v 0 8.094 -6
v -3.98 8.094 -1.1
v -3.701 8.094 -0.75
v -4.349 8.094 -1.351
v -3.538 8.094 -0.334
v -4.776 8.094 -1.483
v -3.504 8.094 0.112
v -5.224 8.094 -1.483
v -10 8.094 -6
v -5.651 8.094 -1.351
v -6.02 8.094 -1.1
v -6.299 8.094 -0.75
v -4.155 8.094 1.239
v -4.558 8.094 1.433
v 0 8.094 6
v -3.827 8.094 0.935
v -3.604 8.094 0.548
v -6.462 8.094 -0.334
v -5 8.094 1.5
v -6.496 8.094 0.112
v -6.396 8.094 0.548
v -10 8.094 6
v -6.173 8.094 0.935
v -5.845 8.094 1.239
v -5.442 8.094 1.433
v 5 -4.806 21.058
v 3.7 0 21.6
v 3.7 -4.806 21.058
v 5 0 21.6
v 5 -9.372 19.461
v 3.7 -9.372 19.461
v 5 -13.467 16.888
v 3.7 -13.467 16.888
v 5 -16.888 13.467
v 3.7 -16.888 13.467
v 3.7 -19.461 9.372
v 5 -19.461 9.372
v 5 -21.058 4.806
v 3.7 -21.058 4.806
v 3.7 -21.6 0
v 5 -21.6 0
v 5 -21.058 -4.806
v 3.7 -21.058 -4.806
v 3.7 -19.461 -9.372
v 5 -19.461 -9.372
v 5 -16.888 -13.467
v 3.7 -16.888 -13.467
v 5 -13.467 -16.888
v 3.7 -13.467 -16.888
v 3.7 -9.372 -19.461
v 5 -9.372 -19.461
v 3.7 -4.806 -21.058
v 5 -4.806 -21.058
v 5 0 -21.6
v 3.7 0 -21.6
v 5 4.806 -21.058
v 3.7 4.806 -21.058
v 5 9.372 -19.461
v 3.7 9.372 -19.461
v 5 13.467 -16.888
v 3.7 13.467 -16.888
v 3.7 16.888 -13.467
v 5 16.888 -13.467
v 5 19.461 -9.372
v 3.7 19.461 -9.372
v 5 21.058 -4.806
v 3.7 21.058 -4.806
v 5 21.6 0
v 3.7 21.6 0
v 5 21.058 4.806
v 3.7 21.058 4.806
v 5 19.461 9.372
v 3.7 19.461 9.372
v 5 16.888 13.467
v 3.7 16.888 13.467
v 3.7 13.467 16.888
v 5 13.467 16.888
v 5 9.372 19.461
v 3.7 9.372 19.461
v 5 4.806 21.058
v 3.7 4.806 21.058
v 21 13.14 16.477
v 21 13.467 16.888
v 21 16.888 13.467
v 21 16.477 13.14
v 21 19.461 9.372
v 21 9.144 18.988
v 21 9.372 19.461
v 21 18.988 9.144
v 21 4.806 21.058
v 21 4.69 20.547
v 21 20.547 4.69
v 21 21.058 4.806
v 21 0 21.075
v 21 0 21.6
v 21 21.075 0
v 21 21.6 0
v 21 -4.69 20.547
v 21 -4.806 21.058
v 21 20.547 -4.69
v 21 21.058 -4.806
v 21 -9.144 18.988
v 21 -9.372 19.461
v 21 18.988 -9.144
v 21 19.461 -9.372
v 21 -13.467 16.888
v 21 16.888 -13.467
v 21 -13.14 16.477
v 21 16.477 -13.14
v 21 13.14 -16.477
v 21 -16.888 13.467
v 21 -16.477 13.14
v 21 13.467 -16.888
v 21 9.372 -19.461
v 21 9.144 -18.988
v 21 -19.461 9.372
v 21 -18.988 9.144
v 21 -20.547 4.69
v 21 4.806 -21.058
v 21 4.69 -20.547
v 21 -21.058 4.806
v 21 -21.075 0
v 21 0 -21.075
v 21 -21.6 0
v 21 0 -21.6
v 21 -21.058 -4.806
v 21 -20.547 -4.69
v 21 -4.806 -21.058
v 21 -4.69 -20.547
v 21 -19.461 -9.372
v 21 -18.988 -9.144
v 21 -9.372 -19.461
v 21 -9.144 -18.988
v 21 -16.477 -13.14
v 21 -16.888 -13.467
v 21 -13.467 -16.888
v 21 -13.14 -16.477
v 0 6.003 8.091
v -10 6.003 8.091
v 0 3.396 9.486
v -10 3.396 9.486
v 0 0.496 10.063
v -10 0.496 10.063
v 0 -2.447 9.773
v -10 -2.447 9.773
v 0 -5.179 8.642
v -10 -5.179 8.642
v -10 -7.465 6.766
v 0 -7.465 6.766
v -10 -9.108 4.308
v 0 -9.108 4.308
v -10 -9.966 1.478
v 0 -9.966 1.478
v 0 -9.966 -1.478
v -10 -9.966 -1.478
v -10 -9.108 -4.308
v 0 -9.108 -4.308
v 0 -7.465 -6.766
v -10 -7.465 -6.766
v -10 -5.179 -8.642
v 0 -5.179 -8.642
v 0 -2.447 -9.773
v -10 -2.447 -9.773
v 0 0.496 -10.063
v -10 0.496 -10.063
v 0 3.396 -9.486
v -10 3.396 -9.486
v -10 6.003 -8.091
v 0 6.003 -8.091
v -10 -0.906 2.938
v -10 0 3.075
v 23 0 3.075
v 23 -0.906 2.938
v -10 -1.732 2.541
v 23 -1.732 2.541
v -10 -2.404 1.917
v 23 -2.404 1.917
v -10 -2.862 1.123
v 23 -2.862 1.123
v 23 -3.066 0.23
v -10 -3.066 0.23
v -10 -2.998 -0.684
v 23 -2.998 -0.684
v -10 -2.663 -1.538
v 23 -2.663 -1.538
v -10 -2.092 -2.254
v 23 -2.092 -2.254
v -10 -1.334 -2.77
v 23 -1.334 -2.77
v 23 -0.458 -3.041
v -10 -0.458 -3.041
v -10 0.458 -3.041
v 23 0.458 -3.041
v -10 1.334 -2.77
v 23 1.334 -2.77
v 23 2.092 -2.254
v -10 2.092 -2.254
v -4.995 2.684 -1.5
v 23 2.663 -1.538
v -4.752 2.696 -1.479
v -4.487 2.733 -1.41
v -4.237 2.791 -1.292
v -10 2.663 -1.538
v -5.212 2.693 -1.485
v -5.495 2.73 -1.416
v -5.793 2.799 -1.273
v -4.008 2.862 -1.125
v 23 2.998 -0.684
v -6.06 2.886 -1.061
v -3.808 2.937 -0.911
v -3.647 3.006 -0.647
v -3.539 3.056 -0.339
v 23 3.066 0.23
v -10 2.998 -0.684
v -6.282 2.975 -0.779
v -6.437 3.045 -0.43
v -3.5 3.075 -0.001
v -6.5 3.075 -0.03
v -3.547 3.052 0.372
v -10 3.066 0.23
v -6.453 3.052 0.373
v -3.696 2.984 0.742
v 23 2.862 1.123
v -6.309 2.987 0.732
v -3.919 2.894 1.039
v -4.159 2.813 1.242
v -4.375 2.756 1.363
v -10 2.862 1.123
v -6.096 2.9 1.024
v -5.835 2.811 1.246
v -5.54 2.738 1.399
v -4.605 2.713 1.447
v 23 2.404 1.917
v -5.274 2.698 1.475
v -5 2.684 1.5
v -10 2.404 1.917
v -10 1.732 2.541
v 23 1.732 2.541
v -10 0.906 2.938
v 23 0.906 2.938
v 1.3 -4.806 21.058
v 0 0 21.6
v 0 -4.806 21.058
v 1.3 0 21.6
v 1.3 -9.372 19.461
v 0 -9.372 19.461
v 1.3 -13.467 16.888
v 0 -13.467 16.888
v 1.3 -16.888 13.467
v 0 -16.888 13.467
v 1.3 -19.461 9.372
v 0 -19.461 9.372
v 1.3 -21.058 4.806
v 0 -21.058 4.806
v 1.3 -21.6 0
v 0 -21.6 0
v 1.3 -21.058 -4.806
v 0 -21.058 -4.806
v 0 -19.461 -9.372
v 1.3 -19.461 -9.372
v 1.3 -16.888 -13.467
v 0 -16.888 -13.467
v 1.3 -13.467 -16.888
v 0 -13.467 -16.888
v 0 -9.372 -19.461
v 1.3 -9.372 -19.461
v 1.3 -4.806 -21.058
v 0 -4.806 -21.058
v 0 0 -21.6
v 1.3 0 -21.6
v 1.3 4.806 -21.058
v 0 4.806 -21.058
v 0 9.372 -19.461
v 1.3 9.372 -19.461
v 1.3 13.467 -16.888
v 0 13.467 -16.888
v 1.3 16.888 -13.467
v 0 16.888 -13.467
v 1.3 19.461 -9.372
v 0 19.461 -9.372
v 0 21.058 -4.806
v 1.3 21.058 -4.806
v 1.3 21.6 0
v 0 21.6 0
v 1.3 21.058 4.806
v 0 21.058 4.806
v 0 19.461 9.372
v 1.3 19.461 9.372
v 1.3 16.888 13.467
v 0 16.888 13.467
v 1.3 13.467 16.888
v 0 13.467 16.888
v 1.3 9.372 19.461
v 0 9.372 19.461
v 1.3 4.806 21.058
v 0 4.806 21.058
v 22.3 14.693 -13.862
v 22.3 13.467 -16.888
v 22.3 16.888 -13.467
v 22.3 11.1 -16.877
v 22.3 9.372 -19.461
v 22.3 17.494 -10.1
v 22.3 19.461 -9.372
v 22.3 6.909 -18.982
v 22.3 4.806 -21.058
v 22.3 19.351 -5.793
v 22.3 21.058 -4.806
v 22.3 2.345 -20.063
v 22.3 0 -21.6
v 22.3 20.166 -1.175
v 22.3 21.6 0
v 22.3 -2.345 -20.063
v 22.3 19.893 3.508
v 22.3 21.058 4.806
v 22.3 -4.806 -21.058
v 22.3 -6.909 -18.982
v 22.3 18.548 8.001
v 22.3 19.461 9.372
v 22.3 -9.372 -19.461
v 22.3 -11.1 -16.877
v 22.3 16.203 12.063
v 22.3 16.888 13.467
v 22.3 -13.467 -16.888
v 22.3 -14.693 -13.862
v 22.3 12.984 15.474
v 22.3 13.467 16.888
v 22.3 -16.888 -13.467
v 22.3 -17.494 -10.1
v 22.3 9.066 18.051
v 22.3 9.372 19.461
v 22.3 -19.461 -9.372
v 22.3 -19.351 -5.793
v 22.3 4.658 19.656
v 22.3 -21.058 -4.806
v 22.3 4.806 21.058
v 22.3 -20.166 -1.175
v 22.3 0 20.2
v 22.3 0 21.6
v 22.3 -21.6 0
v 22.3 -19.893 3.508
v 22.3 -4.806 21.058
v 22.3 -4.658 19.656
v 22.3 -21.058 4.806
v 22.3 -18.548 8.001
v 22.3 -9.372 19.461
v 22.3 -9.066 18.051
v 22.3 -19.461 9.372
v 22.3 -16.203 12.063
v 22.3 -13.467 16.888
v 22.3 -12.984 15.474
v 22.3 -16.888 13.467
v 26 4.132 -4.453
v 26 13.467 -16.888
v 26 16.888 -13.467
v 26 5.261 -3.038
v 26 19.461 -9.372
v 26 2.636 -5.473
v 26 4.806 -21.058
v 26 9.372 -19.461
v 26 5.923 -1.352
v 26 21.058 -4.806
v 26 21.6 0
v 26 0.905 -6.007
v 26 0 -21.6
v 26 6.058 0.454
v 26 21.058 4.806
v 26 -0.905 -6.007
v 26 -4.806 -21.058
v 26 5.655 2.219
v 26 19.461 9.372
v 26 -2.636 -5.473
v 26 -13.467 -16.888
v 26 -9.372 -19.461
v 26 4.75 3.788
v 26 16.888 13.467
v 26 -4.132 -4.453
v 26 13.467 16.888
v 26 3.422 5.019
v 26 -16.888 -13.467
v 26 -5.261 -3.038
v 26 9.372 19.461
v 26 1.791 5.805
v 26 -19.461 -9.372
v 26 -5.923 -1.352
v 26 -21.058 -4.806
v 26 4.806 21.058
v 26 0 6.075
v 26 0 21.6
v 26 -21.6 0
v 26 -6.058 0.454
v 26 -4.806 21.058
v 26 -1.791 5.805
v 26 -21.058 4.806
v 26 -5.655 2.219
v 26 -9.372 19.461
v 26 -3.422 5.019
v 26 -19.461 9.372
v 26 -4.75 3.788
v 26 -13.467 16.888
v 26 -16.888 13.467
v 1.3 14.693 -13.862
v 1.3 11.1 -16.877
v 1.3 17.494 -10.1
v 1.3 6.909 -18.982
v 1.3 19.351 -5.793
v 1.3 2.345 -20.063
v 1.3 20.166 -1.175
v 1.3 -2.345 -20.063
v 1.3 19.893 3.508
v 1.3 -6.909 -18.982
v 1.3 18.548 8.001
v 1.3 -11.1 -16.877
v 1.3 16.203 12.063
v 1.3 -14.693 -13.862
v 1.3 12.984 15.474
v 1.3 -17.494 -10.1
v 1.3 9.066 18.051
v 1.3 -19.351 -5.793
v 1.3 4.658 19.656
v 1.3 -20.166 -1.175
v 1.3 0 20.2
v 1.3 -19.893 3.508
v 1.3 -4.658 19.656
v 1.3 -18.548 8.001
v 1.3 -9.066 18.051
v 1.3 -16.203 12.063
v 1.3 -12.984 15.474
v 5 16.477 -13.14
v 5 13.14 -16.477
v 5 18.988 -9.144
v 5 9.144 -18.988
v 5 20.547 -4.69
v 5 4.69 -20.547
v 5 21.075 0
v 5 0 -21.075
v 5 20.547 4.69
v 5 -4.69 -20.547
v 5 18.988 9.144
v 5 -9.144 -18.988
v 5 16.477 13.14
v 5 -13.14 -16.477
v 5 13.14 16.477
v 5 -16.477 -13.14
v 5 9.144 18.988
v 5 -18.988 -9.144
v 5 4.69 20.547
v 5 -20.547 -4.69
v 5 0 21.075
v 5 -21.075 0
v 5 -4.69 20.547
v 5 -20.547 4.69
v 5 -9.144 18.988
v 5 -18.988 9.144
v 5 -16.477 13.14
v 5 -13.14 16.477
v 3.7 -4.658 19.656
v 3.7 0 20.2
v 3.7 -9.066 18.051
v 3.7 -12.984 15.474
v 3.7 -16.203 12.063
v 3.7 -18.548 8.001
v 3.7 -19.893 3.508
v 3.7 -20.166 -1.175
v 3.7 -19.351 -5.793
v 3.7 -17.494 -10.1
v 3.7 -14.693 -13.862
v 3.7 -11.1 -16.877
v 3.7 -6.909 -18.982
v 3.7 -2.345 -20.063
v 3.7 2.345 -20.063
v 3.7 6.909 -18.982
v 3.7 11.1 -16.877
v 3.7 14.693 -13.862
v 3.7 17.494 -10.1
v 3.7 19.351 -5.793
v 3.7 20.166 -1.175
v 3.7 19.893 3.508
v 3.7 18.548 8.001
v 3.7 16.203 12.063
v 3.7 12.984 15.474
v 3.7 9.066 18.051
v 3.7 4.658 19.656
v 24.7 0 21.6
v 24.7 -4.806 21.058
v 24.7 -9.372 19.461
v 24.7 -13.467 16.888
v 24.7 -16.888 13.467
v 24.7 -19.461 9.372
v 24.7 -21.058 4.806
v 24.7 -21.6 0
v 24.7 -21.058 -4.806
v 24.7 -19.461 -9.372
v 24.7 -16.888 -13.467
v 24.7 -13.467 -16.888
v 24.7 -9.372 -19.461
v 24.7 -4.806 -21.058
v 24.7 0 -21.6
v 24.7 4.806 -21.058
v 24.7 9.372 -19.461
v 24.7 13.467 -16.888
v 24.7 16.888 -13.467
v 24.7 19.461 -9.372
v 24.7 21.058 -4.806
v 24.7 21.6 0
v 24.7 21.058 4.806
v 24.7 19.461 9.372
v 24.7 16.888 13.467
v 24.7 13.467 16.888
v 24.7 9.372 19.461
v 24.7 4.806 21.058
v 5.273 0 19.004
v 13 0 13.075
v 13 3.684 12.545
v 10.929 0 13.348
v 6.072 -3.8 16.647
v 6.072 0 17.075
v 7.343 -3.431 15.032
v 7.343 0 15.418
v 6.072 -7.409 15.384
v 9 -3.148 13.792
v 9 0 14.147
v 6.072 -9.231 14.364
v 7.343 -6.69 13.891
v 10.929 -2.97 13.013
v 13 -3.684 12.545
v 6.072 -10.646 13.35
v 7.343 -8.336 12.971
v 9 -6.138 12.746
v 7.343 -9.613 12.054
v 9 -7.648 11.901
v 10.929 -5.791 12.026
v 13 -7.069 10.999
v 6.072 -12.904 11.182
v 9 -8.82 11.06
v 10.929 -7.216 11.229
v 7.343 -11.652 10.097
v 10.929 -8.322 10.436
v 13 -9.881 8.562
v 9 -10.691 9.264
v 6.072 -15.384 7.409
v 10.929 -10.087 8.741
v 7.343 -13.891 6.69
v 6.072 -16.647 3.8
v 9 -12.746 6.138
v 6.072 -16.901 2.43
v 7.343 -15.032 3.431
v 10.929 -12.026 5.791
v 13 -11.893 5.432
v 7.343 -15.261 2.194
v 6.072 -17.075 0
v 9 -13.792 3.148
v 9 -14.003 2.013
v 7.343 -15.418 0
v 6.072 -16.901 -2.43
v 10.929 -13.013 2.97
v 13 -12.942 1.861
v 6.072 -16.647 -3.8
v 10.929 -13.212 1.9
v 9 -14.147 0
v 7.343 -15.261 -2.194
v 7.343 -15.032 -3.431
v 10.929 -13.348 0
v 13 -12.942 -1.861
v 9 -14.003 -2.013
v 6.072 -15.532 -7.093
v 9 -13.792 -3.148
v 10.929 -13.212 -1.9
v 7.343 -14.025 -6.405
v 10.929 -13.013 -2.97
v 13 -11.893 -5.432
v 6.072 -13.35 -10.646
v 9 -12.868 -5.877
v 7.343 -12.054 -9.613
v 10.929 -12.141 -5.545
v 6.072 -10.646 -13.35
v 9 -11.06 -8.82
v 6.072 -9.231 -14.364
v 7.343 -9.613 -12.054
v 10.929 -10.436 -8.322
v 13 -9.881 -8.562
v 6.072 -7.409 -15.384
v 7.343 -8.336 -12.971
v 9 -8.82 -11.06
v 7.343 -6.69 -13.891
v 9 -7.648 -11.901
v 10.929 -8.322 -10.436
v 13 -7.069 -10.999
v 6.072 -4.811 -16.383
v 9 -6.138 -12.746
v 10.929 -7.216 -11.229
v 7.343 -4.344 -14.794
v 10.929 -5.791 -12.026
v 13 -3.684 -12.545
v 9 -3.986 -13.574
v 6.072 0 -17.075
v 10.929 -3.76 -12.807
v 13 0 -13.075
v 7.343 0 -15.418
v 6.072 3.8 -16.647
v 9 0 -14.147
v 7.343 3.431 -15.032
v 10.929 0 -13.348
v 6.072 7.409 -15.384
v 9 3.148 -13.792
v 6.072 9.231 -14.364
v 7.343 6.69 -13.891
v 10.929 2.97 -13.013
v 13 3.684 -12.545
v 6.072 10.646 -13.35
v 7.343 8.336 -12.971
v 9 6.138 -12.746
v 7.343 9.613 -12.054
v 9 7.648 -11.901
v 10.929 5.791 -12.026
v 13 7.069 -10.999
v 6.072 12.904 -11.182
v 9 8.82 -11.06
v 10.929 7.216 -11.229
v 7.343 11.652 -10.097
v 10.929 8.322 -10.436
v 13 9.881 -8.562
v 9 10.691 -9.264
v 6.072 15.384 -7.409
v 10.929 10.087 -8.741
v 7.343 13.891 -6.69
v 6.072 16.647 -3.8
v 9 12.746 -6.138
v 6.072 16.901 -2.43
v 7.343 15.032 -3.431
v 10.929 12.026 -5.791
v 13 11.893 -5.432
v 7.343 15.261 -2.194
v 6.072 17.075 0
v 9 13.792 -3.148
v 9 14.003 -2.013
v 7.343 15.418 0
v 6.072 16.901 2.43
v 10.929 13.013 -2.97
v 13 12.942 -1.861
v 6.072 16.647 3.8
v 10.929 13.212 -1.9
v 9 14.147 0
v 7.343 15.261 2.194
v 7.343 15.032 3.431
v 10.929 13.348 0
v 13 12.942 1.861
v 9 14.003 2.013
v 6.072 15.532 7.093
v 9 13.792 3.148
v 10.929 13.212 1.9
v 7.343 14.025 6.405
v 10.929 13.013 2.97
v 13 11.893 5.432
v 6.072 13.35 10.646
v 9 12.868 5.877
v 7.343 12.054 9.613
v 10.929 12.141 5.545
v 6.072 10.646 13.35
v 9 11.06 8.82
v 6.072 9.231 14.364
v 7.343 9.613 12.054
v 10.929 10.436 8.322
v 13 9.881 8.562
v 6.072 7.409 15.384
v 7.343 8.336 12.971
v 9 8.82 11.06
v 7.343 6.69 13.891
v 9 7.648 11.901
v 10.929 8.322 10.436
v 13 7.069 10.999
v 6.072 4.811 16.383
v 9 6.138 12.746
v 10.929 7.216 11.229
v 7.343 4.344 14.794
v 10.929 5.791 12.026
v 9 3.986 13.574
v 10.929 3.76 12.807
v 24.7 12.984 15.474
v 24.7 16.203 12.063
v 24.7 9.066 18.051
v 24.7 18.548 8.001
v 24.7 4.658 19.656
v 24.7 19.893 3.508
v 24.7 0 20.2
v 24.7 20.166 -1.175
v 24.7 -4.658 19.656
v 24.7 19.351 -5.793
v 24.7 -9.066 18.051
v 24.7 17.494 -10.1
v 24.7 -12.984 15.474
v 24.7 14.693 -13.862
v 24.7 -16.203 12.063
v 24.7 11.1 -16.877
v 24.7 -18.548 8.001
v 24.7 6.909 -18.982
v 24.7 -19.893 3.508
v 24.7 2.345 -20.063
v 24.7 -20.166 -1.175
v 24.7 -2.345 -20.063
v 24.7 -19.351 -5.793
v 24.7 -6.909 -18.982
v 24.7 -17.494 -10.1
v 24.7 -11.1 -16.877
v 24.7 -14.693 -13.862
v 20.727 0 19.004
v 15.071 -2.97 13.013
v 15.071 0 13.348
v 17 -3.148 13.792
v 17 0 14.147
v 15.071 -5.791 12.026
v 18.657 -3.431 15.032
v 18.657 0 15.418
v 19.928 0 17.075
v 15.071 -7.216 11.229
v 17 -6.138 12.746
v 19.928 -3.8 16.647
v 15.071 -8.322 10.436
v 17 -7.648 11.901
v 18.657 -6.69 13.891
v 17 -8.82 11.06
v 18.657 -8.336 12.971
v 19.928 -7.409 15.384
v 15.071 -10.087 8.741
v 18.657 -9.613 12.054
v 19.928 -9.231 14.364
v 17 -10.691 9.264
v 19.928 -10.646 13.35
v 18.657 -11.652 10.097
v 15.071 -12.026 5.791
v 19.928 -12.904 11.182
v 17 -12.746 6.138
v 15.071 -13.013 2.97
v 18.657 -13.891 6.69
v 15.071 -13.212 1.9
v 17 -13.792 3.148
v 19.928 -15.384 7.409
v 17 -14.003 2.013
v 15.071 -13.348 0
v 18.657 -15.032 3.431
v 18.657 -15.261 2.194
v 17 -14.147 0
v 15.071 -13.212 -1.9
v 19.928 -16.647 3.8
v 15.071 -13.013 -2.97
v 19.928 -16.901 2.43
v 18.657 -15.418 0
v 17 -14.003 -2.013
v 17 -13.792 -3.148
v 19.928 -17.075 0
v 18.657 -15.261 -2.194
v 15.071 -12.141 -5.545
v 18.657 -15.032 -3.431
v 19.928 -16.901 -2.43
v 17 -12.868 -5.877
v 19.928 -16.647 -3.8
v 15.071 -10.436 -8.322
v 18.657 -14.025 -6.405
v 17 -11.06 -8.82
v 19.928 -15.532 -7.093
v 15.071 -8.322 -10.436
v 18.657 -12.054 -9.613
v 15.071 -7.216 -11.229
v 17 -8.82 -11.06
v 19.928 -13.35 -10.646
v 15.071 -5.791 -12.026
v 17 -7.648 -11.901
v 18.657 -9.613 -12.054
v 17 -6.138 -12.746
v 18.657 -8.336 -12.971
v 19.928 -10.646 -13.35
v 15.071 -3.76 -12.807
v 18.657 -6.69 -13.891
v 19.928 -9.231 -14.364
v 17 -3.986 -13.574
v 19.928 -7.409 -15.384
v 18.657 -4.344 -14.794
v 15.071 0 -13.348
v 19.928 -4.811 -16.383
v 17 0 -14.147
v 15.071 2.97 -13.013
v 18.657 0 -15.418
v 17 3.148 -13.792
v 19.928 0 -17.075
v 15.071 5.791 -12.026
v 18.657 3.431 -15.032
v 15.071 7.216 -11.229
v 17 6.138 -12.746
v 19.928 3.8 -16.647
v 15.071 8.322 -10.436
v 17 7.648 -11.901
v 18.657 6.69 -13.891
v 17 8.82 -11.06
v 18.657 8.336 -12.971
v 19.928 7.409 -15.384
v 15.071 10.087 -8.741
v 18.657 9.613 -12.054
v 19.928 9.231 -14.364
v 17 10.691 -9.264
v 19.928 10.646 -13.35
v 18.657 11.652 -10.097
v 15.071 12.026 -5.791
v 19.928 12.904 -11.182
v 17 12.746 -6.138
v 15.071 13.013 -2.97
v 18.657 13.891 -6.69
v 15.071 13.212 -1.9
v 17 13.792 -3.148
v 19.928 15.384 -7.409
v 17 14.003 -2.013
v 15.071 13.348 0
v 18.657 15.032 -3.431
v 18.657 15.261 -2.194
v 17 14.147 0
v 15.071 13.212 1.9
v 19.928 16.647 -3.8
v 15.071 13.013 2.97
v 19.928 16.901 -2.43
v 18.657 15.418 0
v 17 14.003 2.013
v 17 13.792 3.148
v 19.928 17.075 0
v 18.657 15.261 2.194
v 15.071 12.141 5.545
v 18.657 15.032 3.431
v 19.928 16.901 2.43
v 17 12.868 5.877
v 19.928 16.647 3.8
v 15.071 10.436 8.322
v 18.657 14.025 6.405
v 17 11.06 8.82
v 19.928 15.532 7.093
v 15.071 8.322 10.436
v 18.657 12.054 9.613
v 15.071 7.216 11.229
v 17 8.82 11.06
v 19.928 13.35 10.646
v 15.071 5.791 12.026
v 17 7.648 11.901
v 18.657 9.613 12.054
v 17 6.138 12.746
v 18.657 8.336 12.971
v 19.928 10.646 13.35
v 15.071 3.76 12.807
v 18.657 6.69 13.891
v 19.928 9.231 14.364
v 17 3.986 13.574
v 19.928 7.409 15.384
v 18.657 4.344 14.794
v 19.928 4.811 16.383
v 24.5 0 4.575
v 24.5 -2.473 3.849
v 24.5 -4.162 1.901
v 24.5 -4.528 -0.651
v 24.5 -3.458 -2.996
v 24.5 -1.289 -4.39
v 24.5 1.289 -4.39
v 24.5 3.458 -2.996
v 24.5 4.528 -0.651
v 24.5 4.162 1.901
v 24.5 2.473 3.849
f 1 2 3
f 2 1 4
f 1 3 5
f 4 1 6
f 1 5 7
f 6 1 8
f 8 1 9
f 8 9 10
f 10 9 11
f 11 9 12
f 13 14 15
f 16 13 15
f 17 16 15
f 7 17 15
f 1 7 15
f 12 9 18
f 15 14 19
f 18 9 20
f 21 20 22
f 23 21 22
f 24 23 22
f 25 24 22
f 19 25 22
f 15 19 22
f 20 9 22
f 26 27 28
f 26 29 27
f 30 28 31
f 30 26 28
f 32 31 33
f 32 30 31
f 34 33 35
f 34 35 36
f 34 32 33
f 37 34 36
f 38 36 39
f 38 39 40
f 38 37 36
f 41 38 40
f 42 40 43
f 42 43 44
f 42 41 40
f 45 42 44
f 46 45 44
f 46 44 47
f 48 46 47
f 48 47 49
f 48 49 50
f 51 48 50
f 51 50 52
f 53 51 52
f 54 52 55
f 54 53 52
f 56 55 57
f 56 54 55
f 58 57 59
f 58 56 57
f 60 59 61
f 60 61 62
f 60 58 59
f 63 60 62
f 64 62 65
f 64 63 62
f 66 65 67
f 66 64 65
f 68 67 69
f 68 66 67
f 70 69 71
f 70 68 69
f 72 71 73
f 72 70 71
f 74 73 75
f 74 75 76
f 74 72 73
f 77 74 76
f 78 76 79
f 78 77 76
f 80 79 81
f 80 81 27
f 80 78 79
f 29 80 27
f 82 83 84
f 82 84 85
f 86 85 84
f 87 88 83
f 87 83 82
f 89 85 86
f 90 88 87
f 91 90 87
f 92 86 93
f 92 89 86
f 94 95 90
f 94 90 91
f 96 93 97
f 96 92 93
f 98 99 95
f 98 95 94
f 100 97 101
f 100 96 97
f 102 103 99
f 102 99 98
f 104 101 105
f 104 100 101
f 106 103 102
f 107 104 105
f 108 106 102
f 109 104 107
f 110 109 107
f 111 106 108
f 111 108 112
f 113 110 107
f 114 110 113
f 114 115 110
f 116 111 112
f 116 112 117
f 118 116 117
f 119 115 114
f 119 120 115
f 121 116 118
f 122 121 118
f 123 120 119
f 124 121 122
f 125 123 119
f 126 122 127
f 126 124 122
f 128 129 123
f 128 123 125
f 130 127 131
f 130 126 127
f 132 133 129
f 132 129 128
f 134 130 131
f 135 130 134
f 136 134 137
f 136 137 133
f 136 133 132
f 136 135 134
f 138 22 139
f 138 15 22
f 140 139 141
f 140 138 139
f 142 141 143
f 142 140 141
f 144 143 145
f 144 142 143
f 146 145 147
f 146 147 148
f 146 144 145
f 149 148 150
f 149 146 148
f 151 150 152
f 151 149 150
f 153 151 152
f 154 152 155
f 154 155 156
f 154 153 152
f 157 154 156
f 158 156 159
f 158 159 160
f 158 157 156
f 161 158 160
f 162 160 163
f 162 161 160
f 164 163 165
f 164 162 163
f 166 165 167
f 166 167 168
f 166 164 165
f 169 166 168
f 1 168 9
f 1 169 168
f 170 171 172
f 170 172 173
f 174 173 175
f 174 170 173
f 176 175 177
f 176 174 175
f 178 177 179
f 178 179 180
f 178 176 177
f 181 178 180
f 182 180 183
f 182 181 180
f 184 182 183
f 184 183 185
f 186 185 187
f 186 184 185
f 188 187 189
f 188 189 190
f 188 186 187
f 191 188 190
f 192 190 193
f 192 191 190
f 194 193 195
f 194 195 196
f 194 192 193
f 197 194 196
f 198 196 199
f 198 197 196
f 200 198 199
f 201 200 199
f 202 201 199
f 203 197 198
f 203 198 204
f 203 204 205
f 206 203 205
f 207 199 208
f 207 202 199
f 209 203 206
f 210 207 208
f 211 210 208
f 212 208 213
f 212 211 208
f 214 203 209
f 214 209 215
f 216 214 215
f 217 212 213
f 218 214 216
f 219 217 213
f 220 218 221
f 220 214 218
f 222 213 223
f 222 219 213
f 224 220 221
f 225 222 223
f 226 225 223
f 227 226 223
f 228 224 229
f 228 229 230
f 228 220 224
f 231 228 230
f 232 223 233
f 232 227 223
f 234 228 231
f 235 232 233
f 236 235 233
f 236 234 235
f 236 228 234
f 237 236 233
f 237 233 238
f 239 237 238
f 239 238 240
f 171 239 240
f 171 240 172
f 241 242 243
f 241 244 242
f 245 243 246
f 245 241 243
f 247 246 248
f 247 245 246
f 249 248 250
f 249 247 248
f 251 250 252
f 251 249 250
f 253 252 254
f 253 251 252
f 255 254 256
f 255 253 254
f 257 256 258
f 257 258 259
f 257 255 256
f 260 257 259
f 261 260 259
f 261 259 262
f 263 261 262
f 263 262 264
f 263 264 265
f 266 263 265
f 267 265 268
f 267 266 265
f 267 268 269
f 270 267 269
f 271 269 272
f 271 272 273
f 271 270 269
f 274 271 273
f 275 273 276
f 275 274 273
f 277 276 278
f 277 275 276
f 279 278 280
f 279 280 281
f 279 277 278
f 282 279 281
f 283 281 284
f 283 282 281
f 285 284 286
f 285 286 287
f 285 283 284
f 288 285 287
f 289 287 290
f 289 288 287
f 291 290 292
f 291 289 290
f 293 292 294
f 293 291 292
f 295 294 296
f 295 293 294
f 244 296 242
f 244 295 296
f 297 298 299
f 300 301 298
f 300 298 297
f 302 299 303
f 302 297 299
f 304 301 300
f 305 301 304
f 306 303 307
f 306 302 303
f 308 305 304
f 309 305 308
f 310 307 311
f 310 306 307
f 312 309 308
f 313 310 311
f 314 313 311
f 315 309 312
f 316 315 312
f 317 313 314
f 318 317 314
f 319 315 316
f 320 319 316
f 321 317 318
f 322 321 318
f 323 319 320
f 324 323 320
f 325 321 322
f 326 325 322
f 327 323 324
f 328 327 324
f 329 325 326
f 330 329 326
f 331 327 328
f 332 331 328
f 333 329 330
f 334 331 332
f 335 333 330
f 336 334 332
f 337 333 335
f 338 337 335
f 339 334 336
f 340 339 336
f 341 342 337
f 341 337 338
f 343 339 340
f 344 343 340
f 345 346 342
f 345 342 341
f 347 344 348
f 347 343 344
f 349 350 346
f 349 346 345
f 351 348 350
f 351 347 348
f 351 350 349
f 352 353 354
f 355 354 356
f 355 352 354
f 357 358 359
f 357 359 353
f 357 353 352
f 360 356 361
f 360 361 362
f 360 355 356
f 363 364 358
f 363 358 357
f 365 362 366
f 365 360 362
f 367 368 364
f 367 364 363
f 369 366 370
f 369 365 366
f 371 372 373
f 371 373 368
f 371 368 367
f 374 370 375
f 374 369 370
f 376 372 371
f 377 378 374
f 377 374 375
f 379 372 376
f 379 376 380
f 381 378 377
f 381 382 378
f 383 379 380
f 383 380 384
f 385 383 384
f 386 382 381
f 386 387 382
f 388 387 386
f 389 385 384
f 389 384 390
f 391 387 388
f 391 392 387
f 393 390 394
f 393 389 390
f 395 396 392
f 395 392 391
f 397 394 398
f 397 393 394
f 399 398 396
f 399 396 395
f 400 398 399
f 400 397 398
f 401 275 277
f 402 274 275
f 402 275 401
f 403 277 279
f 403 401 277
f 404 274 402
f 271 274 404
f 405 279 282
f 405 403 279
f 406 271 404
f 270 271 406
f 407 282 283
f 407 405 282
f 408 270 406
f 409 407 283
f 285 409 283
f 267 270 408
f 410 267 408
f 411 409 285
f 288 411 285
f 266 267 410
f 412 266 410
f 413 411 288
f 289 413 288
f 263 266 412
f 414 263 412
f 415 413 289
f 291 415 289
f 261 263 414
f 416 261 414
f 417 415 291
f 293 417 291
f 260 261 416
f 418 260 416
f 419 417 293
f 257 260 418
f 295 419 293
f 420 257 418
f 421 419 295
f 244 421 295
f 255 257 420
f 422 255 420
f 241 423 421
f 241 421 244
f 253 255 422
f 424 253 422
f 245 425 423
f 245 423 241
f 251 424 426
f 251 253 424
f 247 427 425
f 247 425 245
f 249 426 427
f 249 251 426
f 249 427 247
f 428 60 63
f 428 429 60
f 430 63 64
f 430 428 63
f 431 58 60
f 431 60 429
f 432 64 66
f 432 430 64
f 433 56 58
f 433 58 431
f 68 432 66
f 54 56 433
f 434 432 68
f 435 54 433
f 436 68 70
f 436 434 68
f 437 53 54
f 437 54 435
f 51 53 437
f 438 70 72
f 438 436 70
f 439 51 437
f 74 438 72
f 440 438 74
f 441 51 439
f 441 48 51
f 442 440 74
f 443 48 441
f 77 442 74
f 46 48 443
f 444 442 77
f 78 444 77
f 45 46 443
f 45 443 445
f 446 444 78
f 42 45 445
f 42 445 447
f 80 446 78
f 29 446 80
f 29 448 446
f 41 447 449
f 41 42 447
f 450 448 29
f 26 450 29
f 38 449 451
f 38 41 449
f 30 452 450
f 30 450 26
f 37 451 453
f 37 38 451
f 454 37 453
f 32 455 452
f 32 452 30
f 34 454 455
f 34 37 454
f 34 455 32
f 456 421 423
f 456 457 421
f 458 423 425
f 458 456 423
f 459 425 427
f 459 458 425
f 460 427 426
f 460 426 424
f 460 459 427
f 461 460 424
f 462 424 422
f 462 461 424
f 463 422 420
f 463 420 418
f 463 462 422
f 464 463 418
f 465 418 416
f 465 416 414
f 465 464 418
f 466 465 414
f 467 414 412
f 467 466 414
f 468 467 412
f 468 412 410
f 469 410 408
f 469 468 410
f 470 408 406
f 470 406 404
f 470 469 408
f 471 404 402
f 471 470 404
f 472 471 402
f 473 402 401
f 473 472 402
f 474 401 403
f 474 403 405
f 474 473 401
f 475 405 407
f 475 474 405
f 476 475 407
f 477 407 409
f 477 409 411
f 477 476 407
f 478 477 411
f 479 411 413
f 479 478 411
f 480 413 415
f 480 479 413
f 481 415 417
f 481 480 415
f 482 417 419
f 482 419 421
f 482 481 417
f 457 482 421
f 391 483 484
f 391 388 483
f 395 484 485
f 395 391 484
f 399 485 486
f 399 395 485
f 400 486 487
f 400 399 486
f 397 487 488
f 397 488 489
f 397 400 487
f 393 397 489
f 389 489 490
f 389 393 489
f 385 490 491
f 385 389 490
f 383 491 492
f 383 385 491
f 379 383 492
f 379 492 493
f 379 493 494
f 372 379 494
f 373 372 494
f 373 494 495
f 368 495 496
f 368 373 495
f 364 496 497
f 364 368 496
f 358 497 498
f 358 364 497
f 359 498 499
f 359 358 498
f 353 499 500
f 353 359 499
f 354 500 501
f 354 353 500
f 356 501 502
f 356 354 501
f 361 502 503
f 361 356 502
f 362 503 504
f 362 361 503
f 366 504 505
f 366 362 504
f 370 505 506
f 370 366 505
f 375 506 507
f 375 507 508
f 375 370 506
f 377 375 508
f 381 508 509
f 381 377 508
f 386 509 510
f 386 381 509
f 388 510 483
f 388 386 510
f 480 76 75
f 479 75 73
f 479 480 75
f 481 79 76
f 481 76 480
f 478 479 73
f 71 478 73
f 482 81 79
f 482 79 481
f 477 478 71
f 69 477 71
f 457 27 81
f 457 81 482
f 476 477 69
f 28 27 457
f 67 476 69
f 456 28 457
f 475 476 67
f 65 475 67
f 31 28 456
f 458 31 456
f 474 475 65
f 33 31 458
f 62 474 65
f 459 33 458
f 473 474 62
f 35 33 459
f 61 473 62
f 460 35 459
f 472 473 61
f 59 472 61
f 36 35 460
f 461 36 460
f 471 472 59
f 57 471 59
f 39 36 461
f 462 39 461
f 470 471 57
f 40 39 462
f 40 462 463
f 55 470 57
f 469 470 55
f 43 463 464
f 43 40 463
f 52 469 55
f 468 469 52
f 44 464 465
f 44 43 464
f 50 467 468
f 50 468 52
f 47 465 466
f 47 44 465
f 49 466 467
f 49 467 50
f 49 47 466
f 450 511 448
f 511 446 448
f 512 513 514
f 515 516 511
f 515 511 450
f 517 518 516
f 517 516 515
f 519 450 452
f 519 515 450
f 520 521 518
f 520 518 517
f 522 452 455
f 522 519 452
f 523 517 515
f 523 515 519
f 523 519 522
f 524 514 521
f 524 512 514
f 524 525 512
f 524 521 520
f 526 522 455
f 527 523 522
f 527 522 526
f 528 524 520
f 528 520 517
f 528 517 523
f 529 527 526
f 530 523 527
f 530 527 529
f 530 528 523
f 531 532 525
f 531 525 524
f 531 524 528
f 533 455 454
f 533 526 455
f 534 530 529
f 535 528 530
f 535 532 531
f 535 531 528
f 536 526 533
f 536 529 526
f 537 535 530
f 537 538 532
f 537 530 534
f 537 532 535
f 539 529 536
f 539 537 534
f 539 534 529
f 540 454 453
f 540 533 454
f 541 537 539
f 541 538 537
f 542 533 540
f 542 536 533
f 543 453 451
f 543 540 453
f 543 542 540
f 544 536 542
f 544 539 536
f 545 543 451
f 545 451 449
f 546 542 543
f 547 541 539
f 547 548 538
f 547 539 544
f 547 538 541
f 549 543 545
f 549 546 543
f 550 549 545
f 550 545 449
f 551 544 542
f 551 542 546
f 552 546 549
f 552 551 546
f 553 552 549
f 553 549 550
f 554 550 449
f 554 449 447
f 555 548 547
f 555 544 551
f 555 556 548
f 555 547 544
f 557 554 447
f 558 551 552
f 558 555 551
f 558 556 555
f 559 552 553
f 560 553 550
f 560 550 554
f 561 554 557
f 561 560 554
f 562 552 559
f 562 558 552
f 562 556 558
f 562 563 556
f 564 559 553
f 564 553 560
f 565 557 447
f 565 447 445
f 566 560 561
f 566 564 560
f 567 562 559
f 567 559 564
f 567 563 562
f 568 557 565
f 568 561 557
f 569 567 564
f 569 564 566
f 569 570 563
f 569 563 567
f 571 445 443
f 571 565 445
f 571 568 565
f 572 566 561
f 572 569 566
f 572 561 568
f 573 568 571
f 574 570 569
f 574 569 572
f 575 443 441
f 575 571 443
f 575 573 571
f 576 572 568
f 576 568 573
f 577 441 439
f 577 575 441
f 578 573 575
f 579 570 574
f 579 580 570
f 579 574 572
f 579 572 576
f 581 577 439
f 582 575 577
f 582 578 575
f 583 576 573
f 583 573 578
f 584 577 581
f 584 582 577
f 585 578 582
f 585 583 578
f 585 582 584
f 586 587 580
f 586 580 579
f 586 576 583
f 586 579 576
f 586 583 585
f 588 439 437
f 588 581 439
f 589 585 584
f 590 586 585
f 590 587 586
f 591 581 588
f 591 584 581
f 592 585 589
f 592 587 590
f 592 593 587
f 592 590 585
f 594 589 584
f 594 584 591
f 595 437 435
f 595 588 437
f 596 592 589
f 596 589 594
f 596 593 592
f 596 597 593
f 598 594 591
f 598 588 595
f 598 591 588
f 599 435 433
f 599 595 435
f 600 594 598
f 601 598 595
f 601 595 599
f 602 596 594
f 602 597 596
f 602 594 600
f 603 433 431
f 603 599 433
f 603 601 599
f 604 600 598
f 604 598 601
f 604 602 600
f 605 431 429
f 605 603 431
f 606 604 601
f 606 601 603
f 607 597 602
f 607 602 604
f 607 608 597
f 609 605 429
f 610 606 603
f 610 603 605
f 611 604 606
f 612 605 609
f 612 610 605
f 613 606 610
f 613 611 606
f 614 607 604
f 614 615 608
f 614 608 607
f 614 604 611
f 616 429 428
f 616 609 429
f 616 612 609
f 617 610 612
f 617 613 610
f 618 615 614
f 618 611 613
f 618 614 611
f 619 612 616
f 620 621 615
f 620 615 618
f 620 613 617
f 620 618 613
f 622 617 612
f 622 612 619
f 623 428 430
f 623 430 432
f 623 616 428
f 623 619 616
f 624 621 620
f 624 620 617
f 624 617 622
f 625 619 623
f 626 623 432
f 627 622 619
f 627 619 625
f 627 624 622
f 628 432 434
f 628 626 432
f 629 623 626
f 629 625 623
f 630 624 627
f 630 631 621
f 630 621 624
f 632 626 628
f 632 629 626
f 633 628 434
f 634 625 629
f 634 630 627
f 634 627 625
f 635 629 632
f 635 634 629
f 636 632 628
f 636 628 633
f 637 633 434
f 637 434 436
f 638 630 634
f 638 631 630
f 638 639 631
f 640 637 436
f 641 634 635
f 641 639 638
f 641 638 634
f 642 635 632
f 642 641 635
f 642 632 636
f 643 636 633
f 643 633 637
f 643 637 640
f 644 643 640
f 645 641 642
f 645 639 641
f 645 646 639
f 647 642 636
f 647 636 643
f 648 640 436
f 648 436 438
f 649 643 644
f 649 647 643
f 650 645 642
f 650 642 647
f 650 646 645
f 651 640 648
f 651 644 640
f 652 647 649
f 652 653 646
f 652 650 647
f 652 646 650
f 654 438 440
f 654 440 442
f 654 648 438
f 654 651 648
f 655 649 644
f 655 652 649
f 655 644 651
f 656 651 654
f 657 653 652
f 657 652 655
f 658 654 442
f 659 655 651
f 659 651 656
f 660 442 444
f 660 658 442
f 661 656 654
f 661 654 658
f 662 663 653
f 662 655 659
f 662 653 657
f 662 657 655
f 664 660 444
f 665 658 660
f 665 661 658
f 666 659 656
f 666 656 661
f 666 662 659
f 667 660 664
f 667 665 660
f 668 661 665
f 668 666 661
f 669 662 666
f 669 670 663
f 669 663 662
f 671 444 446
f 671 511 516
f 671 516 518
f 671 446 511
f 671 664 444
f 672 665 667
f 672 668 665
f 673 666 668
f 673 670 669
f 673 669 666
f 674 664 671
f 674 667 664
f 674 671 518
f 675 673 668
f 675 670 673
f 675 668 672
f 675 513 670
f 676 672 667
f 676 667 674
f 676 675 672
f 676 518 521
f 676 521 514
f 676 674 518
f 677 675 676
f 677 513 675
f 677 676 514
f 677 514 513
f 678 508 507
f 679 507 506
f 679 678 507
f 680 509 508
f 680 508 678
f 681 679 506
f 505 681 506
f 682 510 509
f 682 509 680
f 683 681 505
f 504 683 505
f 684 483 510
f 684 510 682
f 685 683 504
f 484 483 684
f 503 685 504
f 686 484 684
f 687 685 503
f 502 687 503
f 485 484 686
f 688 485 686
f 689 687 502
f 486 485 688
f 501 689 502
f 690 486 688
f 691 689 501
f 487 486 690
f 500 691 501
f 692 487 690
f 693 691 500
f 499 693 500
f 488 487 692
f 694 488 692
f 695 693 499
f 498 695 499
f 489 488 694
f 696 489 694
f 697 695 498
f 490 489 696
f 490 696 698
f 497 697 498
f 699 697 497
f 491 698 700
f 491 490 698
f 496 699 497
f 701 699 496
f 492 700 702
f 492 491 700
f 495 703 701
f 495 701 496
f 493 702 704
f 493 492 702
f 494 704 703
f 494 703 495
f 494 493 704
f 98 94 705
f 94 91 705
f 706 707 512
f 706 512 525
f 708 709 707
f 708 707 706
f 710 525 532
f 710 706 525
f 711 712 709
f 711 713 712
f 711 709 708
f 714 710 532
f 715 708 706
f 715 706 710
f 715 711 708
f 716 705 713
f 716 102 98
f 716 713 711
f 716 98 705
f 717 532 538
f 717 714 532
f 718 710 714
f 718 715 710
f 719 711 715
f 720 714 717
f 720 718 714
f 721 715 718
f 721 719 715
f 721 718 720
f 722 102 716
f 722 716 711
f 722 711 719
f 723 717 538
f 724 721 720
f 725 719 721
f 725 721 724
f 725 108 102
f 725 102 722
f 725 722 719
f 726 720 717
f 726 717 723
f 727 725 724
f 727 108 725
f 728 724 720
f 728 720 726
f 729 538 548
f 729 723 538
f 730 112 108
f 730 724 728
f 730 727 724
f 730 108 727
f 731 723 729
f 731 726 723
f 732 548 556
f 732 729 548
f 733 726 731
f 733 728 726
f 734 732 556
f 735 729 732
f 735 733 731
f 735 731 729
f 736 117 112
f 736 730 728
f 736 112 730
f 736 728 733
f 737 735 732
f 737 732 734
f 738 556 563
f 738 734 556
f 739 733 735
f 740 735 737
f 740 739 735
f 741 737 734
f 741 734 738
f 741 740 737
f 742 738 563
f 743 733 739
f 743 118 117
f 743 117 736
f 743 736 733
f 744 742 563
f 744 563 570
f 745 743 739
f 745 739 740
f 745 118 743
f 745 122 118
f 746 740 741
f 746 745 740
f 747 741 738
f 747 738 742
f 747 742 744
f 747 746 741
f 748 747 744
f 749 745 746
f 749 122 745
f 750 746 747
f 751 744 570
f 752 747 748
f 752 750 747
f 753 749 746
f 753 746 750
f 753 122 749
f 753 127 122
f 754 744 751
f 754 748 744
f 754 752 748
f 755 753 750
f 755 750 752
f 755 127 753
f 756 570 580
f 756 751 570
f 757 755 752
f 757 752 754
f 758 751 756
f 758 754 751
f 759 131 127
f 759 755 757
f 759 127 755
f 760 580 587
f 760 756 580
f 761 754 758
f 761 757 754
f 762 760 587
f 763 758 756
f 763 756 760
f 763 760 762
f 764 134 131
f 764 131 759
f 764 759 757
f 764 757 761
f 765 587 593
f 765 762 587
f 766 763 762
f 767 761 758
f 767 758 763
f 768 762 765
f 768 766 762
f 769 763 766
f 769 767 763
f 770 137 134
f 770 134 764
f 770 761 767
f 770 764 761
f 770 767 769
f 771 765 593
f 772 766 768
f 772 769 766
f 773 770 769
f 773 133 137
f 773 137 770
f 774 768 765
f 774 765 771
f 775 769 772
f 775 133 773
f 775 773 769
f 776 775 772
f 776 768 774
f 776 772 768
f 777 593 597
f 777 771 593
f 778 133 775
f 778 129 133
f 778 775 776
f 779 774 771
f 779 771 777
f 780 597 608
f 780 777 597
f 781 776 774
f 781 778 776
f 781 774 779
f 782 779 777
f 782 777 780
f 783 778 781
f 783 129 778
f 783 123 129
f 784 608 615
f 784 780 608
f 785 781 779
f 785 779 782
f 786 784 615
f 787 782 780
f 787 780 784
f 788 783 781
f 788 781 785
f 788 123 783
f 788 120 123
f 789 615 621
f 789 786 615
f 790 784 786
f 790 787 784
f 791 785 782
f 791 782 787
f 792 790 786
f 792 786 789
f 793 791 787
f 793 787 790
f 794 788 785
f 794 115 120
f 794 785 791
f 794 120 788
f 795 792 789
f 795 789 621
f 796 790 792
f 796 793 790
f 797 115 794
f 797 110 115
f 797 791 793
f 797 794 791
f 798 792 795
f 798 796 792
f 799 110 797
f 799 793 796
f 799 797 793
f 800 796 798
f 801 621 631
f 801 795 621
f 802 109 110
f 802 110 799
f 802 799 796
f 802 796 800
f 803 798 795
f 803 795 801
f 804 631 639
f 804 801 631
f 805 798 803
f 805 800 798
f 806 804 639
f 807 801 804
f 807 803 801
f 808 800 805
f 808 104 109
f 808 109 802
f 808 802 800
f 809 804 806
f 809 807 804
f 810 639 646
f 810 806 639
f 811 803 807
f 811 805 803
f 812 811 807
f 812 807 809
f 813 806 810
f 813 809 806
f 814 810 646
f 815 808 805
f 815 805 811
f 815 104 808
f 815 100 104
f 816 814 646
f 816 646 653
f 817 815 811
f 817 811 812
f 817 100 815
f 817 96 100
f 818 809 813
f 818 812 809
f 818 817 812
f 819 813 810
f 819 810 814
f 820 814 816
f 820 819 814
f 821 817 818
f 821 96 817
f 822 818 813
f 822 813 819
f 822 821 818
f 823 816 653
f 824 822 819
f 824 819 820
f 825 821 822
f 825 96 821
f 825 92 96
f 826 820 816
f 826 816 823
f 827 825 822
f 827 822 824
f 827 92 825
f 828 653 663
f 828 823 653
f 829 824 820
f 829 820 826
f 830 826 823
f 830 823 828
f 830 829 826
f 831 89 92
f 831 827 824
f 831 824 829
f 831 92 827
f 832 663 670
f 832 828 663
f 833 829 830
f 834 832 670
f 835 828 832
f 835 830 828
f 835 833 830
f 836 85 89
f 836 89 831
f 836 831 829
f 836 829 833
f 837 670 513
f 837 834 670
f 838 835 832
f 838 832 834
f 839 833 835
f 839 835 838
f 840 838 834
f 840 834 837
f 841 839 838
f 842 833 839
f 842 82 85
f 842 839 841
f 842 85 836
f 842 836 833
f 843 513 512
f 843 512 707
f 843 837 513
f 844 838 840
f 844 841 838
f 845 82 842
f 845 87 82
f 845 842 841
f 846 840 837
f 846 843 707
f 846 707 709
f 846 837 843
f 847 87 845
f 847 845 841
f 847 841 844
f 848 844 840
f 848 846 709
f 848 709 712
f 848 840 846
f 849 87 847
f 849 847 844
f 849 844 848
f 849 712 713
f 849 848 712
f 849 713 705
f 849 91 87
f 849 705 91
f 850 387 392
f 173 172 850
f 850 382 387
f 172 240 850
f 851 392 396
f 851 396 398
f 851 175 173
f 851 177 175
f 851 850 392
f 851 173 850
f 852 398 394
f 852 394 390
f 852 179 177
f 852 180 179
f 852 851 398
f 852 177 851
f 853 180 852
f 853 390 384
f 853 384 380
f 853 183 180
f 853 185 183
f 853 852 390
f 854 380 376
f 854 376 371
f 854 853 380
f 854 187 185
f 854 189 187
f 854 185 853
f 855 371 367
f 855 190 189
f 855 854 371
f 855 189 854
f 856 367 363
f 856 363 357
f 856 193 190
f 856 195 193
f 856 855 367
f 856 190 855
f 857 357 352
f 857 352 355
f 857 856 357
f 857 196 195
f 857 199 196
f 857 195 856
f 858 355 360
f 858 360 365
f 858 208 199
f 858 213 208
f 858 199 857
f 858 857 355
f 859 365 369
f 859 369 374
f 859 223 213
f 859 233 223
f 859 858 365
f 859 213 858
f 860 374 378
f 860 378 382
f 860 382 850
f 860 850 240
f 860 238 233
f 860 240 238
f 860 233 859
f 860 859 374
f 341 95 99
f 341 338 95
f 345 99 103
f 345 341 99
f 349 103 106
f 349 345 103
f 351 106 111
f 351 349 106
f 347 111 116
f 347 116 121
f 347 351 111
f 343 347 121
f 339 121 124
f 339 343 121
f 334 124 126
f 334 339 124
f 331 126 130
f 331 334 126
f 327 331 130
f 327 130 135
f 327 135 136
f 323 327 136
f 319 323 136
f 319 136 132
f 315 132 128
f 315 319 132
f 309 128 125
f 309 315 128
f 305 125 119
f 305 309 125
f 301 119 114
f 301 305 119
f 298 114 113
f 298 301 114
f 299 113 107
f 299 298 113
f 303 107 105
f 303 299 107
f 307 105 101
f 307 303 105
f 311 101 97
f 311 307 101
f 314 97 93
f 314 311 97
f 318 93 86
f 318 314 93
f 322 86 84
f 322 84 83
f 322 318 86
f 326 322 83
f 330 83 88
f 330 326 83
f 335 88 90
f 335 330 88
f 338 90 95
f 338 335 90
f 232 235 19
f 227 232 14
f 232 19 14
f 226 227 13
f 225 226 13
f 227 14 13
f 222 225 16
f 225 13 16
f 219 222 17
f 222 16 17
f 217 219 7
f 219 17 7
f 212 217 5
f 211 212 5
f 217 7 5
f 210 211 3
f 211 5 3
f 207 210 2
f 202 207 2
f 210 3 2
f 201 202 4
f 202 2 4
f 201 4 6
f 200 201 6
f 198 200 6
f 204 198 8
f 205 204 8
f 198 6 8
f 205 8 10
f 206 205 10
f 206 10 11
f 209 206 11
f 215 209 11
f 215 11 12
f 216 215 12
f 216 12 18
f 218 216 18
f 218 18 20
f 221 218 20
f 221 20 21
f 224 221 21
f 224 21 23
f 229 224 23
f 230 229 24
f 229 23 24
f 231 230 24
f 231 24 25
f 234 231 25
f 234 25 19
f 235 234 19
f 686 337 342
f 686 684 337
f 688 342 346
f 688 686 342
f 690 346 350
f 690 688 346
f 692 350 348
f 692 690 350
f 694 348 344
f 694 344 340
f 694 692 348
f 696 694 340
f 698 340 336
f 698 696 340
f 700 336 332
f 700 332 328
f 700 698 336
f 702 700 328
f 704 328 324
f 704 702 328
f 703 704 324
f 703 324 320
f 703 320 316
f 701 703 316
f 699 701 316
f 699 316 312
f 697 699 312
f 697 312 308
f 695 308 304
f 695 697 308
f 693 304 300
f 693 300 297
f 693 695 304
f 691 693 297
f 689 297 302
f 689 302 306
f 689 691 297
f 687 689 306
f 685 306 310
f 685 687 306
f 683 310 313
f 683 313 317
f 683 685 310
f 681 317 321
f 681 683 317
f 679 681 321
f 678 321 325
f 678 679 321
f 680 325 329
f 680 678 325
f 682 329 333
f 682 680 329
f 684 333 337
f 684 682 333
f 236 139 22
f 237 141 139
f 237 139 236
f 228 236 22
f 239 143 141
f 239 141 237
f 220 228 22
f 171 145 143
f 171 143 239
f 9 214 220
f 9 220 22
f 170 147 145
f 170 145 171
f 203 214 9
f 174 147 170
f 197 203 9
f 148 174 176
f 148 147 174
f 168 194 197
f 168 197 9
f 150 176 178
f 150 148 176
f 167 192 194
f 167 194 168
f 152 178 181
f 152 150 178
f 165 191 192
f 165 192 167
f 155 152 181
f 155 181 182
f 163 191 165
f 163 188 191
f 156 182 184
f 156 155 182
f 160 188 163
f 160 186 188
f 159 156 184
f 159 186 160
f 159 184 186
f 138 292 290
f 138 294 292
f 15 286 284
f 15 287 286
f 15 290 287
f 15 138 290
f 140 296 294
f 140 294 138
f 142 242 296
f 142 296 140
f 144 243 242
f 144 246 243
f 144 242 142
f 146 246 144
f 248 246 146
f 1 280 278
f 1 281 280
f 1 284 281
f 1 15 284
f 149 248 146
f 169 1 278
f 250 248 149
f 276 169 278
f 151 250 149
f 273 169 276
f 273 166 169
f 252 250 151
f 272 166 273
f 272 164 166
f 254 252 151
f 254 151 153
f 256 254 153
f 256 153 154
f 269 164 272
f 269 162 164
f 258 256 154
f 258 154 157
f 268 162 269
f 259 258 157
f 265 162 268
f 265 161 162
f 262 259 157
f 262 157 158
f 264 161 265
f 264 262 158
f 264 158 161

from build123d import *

# Parameters (mm, degrees)
FILLET3_R               = 8
FILLET4_R               = 8
SKETCH3_W               = 12
SKETCH3_H               = 3.642473792
CUT_EXTRUDE1_DEPTH      = 10
CUT_EXTRUDE2_REACH      = 46.992
CUT_EXTRUDE2_END_RADIUS = 3.075
SKETCH4_R               = 1.5
CHAMFER1_SIZE           = 3


with BuildPart() as part:
    # Sketch1 → Revolve1 (revolve)
    with BuildSketch(Plane.XY, mode=Mode.PRIVATE) as revolve1_sk:
        Polygon((0, 21.6), (1.3, 21.6), (1.3, 20.2), (3.7, 20.2), (3.7, 21.6), (5, 21.6), (5, 13.075), (21, 13.075), (21, 21.6), (22.3, 21.6), (22.3, 20.2), (24.7, 20.2), (24.7, 21.6), (26, 21.6), (26, 3.075), (-10, 3.075), (-10, 10.075), (0, 10.075), align=None)
    revolve(revolve1_sk.sketch.rotate(Axis((0, 0, 0), (1, 0, 0)), 90), axis=Axis((0, 0, 0), (1, 0, 0)))

    # Fillet3
    fillet3_edges = [part.edges().sort_by_distance(p)[0] for p in [
        (5, 0, -13.075),
    ]]
    fillet(fillet3_edges, radius=FILLET3_R)

    # Fillet4
    fillet4_edges = [part.edges().sort_by_distance(p)[0] for p in [
        (21, 0, -13.075),
    ]]
    fillet(fillet4_edges, radius=FILLET4_R - 0.0001)  # a hair under: the kernel refuses the full size

    # Sketch3 → Cut-Extrude1 (cut)
    with BuildSketch(Plane.ZY.offset(10)):
        with Locations((0, 9.91479143)):
            Rectangle(SKETCH3_W, SKETCH3_H)
    extrude(amount=-CUT_EXTRUDE1_DEPTH, mode=Mode.SUBTRACT)

    # Cut-Extrude2: up to this cylinder (the profile starts outside it)
    cut_extrude2_end = Plane(origin=(-5, 0, 0), z_dir=(-1, 0, 0)) * Cylinder(CUT_EXTRUDE2_END_RADIUS, 101.134, mode=Mode.PRIVATE)
    # Sketch4 → Cut-Extrude2 (cut, up to the surface)
    with BuildSketch(Plane(origin=(0, 8.093554534, 0), x_dir=(1, 0, 0), z_dir=(0, 1, 0)), mode=Mode.PRIVATE) as cut_extrude2_sk1:
        with Locations(Location((-5, 0, 0), (0, 0, 270))):
            Circle(SKETCH4_R)
    cut_extrude2_tool1 = extrude(cut_extrude2_sk1.sketch, amount=-CUT_EXTRUDE2_REACH, mode=Mode.PRIVATE) - cut_extrude2_end
    add(cut_extrude2_tool1.solids().sort_by_distance((-5, 8.093555, 0))[0], mode=Mode.SUBTRACT)

    # Chamfer1
    chamfer1_edges = [part.edges().sort_by_distance(p)[0] for p in [
        (26, 0, -3.075),
    ]]
    chamfer(chamfer1_edges, length=CHAMFER1_SIZE)


solid = part.part
